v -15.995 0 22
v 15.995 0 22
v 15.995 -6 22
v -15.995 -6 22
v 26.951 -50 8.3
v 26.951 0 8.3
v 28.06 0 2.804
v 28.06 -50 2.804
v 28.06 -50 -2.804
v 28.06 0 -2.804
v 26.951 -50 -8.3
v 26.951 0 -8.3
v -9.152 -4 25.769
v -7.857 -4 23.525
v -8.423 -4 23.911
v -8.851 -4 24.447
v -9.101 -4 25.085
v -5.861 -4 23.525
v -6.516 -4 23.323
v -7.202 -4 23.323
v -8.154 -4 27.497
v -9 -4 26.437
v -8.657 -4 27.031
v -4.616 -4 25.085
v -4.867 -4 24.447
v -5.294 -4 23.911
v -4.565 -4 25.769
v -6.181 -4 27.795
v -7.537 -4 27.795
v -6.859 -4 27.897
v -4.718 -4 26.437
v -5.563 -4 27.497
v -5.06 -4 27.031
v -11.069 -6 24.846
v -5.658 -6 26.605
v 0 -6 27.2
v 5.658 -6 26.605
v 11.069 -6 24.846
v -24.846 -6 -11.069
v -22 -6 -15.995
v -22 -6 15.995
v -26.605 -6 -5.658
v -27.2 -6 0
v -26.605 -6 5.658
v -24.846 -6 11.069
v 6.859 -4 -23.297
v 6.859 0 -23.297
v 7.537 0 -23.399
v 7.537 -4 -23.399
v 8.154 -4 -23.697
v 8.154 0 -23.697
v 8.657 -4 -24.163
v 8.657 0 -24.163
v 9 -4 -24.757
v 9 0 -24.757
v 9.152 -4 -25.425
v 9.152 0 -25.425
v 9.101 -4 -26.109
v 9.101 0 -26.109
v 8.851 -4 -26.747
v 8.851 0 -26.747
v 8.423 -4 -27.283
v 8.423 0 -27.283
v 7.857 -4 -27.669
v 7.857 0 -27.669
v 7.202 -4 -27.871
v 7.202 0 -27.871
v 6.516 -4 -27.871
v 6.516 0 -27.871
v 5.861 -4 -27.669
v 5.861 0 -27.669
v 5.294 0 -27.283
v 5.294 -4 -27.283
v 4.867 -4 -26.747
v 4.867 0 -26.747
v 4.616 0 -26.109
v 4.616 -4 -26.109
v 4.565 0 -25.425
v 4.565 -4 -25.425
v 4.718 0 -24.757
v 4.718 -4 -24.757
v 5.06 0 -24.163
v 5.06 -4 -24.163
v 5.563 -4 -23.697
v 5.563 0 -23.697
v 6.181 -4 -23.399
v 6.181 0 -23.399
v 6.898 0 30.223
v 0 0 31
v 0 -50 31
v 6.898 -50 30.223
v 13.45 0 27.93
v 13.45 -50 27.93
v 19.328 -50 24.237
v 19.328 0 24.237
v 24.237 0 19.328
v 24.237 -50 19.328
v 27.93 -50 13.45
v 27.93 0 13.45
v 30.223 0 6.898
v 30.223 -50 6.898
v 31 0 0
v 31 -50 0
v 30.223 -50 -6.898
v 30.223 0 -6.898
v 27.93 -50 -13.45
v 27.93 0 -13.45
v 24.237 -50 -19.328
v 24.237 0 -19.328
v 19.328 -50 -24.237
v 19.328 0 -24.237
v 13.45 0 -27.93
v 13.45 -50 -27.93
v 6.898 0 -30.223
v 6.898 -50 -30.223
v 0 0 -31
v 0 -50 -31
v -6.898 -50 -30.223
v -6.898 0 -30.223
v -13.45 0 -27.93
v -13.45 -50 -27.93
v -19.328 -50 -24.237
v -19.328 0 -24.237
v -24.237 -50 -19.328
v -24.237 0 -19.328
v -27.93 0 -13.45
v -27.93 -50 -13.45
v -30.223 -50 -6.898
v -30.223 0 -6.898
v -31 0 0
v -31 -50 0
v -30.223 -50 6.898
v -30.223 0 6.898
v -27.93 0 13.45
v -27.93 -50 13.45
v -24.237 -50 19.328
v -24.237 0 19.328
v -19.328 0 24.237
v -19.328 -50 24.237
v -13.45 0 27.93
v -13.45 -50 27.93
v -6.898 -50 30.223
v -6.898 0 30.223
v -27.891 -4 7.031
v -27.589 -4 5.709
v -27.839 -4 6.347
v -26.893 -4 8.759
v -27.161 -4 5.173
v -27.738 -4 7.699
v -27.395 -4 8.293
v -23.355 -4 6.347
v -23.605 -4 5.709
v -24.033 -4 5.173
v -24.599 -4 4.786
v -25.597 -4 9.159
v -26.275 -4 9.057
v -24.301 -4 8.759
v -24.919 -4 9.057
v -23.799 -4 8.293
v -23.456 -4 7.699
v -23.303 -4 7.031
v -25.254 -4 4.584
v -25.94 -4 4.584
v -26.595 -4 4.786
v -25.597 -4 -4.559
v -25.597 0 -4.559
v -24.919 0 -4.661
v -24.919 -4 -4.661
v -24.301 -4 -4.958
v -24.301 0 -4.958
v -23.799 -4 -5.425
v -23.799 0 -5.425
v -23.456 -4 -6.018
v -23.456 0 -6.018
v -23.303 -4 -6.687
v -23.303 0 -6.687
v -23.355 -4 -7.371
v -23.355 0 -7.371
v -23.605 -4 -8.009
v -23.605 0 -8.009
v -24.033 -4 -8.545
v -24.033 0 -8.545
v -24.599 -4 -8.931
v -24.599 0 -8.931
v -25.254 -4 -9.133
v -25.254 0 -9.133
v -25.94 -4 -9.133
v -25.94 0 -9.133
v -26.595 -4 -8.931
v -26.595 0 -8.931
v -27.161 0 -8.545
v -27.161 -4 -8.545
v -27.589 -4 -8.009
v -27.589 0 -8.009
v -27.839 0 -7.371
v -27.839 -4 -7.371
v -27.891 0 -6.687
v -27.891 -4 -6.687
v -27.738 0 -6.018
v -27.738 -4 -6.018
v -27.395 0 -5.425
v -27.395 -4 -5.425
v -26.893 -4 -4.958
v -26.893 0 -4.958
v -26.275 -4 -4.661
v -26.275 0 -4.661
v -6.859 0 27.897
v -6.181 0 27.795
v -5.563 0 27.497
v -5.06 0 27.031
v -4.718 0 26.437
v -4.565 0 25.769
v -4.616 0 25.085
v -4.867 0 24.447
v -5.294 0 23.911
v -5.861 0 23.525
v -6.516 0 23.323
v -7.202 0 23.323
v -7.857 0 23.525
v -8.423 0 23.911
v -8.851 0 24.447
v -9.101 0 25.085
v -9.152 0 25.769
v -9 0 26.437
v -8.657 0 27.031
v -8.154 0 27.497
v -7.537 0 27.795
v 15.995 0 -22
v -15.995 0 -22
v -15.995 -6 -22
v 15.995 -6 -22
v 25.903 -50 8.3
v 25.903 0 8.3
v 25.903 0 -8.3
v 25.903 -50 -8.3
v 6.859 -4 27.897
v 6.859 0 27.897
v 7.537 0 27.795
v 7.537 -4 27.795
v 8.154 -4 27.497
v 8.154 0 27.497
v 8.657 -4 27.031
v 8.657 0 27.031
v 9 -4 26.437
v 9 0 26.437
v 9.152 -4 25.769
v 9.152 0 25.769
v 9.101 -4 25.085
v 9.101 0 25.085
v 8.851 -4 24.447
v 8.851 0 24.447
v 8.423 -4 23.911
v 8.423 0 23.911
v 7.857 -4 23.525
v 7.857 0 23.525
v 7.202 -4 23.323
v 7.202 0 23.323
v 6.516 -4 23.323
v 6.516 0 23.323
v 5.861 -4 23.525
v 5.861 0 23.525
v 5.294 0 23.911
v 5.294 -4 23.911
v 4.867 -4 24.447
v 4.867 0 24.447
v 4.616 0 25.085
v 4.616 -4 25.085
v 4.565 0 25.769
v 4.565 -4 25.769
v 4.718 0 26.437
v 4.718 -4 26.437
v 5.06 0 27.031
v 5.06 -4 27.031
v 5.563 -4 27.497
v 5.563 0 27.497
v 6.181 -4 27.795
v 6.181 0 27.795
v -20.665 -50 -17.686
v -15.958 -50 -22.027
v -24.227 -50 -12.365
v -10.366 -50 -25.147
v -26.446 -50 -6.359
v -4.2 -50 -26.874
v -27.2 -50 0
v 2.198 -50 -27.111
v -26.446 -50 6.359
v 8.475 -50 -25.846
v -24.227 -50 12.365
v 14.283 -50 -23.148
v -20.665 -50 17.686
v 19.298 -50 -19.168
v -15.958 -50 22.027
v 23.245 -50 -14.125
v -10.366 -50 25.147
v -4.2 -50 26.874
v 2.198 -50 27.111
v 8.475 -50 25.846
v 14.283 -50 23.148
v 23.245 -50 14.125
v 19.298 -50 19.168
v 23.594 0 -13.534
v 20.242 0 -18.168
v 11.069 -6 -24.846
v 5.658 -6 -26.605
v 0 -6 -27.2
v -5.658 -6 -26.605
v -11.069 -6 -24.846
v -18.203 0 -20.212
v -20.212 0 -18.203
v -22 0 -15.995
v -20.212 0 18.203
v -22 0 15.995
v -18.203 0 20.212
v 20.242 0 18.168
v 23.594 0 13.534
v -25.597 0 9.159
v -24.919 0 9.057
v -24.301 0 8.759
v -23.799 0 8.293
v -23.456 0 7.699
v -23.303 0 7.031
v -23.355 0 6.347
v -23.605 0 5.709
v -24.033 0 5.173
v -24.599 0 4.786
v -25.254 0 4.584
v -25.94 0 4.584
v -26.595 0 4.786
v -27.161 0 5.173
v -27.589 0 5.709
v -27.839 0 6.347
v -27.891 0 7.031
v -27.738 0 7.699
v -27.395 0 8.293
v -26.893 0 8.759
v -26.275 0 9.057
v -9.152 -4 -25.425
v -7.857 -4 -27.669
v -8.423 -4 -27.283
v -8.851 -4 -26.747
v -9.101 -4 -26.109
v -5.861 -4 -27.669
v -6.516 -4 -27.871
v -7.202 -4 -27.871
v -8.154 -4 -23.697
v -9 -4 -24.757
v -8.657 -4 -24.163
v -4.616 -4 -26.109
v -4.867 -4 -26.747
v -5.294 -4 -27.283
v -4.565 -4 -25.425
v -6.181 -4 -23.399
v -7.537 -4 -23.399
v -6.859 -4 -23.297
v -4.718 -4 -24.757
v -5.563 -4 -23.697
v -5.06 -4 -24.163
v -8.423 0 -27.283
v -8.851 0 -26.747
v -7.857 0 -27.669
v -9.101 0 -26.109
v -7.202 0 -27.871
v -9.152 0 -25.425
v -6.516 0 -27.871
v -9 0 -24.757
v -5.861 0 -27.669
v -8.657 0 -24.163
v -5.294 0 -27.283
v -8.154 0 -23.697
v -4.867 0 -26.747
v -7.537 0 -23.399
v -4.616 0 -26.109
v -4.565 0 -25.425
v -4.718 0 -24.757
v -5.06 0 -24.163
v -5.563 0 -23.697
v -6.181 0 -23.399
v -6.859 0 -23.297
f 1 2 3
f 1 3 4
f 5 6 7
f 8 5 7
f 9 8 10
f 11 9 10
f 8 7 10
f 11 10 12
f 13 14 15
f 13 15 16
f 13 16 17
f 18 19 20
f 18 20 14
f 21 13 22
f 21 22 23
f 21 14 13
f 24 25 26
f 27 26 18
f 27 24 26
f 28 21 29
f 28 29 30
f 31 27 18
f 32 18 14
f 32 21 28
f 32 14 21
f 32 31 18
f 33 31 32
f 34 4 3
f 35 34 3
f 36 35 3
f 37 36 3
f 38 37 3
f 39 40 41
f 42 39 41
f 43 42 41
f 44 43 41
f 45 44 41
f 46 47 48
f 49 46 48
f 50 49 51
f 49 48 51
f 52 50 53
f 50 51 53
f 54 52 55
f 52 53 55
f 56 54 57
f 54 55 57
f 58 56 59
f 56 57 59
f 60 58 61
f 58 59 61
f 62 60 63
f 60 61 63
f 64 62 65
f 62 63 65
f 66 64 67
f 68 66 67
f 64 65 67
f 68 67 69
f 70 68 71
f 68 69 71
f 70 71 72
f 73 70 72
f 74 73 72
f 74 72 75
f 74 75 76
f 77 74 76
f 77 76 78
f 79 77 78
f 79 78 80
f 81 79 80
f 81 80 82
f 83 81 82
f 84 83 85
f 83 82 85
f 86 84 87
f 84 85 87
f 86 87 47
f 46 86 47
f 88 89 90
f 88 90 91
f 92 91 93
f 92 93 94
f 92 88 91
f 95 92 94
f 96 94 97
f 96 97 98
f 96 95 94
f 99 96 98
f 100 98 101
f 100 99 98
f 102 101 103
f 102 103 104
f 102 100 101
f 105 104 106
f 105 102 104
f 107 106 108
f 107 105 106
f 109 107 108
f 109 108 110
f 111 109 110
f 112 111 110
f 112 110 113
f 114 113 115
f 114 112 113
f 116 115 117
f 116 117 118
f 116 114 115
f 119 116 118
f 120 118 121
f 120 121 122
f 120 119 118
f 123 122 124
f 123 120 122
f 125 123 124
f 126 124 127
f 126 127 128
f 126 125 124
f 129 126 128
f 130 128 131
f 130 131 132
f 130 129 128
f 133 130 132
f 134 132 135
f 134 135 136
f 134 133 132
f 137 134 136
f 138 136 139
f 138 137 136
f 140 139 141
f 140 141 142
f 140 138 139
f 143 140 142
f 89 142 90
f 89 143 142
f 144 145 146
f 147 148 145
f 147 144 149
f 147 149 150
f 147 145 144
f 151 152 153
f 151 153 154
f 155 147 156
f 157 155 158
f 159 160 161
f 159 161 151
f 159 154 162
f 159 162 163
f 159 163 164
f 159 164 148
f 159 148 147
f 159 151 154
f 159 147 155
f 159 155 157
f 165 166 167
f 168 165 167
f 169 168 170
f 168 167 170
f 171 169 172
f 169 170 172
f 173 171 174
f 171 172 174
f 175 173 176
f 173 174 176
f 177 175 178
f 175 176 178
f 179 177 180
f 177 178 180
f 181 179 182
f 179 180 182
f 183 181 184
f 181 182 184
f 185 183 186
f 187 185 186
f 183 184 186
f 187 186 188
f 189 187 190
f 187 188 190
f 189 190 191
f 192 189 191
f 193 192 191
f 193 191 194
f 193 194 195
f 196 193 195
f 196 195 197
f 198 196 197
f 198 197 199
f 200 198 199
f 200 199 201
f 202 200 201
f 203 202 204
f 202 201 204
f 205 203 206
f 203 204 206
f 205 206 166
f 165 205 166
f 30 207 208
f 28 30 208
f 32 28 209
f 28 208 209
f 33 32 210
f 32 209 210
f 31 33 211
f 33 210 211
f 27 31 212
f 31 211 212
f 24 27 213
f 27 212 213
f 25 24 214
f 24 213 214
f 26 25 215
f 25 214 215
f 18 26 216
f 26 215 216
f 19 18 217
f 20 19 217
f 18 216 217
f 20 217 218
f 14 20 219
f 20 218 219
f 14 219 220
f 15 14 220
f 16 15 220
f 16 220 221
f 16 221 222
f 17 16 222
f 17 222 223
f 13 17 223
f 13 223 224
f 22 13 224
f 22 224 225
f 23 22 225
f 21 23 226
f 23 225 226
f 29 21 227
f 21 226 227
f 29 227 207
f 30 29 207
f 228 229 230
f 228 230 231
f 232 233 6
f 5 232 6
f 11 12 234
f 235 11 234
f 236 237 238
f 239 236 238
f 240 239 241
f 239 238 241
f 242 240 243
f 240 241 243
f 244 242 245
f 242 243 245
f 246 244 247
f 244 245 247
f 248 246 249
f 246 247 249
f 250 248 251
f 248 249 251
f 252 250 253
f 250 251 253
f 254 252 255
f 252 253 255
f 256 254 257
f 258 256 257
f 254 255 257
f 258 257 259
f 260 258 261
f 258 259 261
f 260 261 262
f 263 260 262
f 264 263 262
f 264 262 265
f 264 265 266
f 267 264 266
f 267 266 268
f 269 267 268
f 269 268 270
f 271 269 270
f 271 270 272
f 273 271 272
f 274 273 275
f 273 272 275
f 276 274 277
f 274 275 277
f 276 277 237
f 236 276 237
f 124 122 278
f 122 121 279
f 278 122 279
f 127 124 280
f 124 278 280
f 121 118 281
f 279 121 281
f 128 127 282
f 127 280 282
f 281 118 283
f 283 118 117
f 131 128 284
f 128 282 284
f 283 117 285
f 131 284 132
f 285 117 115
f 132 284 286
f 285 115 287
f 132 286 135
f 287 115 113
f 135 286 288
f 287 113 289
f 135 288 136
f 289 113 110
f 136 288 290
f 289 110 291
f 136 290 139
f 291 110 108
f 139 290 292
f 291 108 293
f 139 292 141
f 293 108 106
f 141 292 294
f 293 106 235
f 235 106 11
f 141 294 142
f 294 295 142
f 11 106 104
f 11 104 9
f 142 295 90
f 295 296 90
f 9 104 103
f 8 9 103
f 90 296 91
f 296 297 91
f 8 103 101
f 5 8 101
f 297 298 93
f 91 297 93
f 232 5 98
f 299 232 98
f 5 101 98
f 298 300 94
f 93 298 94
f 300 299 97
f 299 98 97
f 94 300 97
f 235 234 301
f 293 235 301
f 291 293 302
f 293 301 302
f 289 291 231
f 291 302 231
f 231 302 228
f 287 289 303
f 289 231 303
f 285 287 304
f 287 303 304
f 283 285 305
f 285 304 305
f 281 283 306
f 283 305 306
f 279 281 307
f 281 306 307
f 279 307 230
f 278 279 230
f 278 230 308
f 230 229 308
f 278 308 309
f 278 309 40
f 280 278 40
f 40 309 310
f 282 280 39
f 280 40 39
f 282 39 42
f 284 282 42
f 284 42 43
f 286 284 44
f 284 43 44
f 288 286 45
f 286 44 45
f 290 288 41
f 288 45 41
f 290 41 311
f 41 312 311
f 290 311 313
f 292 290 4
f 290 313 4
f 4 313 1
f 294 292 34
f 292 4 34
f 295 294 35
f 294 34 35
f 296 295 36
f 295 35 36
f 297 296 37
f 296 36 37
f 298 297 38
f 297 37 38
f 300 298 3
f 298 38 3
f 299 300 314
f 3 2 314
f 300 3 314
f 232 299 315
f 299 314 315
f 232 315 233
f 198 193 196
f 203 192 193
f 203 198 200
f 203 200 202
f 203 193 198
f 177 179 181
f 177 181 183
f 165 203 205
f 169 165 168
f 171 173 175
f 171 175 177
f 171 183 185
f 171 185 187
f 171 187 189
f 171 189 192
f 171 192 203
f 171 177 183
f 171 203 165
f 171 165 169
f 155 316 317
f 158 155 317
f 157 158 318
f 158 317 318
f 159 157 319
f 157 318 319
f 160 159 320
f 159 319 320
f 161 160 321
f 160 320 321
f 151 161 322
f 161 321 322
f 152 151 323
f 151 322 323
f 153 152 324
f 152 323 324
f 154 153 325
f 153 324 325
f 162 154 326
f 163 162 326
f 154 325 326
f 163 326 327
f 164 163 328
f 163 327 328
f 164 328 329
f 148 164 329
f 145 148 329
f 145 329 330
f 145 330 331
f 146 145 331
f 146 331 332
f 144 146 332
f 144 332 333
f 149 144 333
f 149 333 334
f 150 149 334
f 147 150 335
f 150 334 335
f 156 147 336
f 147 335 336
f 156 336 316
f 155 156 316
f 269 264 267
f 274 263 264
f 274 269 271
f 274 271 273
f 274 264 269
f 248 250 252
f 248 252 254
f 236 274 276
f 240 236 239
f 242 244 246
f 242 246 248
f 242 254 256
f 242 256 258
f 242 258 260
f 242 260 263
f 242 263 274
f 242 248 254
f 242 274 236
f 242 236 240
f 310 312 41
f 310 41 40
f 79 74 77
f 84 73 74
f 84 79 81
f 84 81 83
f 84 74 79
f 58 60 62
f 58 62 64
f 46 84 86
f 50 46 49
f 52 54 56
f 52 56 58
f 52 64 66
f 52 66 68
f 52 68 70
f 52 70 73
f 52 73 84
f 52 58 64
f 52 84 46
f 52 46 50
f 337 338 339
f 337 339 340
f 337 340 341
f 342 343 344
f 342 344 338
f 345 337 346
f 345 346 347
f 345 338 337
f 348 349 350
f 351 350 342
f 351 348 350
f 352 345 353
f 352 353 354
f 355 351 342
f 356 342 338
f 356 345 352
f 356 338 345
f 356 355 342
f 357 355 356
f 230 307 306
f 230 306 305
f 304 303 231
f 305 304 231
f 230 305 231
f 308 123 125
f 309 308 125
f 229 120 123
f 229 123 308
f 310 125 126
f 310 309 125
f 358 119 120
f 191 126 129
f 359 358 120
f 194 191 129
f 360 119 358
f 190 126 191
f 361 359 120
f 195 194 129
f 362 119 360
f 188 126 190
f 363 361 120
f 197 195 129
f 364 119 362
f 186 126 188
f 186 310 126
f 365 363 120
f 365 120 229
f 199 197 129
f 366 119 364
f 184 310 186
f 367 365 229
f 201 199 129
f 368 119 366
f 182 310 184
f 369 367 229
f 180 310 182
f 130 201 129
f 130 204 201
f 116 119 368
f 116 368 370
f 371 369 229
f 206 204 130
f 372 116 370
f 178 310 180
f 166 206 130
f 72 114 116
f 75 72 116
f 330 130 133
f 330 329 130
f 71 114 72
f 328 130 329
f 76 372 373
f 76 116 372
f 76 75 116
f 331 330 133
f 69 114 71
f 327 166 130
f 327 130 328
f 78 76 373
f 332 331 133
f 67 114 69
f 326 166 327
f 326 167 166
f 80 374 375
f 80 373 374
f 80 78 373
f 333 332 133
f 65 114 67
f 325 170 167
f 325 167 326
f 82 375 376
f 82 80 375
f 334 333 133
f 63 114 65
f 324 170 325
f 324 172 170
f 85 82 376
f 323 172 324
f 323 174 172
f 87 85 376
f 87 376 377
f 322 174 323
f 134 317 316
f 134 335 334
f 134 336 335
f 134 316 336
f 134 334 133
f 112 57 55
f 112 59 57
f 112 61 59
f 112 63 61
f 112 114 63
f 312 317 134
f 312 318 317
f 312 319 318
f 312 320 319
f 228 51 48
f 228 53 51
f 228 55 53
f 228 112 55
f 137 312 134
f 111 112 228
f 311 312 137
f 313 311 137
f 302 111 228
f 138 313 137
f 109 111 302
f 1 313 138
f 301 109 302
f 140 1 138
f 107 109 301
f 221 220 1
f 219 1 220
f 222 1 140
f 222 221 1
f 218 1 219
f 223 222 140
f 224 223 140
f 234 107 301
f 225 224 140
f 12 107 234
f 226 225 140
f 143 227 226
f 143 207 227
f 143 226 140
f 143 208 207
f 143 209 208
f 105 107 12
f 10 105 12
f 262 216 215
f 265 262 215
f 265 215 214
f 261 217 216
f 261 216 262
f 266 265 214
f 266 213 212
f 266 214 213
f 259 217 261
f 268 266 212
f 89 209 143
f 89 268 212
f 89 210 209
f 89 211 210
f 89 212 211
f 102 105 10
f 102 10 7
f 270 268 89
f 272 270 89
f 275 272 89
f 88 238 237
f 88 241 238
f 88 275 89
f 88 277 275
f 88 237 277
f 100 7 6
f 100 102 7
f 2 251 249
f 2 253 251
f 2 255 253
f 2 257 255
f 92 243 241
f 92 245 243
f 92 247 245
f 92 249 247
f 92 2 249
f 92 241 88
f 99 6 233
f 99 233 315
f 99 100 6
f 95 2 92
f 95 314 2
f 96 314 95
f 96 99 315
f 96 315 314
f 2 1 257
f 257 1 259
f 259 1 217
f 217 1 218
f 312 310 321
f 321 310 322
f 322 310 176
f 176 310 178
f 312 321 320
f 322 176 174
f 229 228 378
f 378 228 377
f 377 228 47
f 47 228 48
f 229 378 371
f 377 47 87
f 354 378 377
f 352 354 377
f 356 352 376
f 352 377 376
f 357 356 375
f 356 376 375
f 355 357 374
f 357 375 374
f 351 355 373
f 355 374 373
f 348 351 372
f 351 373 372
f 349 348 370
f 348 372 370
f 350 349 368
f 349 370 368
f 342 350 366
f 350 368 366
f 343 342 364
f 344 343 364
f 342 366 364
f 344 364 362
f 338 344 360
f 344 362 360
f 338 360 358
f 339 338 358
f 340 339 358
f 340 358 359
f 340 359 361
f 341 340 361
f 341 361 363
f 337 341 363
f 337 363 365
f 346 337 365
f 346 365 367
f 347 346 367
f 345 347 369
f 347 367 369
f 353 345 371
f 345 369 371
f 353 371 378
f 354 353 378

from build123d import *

# Parameters (mm, degrees)
SKETCH1_R           = 31
BOSS_EXTRUDE1_DEPTH = 50
BOSS_EXTRUDE2_DEPTH = 6
SKETCH3_R           = 2.3
CUT_EXTRUDE1_DEPTH  = 4


with BuildPart() as part:
    # Sketch1 → Boss-Extrude1 (new body)
    with BuildSketch(Plane(origin=(0, 0, 0), x_dir=(1, 0, 0), z_dir=(0, 1, 0))):
        with Locations(Location((0, 0, 0), (0, 0, 270))):
            Circle(SKETCH1_R)
        with BuildLine():
            Line((25.902702562, -8.3), (26.950881247, -8.3))
            ThreePointArc((26.950881247, -8.3), (28.2, 0), (26.950881247, 8.3))
            Line((26.950881247, 8.3), (25.902702562, 8.3))
            ThreePointArc((25.902702562, 8.3), (-27.2, 0), (25.902702562, -8.3))
        make_face(mode=Mode.SUBTRACT)
    extrude(amount=-BOSS_EXTRUDE1_DEPTH)

    # Sketch2 → Boss-Extrude2 (add)
    with BuildSketch(Plane(origin=(0, 0, 0), x_dir=(1, 0, 0), z_dir=(0, 1, 0))):
        with BuildLine():
            Line((15.994999219, -22), (-15.994999219, -22))
            ThreePointArc((-15.994999219, -22), (0, -27.2), (15.994999219, -22))
        make_face()
        with BuildLine():
            Line((-15.994999219, 22), (15.994999219, 22))
            ThreePointArc((15.994999219, 22), (0, 27.2), (-15.994999219, 22))
        make_face()
        with BuildLine():
            Line((-22, -15.994999219), (-22, 15.994999219))
            ThreePointArc((-22, 15.994999219), (-27.2, 0), (-22, -15.994999219))
        make_face()
    extrude(amount=-BOSS_EXTRUDE2_DEPTH)

    # Sketch3 → Cut-Extrude1 (cut)
    with BuildSketch(Plane(origin=(0, 0, 0), x_dir=(1, 0, 0), z_dir=(0, 1, 0))):
        with Locations(Location((-25.597034397, 6.858704695, 0), (0, 0, 270))):
            Circle(SKETCH3_R)
        with Locations(Location((-25.597034397, -6.858704695, 0), (0, 0, 270))):
            Circle(SKETCH3_R)
        with Locations(Location((-6.858704695, 25.597034397, 0), (0, 0, 270))):
            Circle(SKETCH3_R)
        with Locations(Location((6.858704695, 25.597034397, 0), (0, 0, 270))):
            Circle(SKETCH3_R)
        with Locations(Location((6.858704695, -25.597034397, 0), (0, 0, 270))):
            Circle(SKETCH3_R)
        with Locations(Location((-6.858704695, -25.597034397, 0), (0, 0, 270))):
            Circle(SKETCH3_R)
    extrude(amount=-CUT_EXTRUDE1_DEPTH, mode=Mode.SUBTRACT)


solid = part.part
